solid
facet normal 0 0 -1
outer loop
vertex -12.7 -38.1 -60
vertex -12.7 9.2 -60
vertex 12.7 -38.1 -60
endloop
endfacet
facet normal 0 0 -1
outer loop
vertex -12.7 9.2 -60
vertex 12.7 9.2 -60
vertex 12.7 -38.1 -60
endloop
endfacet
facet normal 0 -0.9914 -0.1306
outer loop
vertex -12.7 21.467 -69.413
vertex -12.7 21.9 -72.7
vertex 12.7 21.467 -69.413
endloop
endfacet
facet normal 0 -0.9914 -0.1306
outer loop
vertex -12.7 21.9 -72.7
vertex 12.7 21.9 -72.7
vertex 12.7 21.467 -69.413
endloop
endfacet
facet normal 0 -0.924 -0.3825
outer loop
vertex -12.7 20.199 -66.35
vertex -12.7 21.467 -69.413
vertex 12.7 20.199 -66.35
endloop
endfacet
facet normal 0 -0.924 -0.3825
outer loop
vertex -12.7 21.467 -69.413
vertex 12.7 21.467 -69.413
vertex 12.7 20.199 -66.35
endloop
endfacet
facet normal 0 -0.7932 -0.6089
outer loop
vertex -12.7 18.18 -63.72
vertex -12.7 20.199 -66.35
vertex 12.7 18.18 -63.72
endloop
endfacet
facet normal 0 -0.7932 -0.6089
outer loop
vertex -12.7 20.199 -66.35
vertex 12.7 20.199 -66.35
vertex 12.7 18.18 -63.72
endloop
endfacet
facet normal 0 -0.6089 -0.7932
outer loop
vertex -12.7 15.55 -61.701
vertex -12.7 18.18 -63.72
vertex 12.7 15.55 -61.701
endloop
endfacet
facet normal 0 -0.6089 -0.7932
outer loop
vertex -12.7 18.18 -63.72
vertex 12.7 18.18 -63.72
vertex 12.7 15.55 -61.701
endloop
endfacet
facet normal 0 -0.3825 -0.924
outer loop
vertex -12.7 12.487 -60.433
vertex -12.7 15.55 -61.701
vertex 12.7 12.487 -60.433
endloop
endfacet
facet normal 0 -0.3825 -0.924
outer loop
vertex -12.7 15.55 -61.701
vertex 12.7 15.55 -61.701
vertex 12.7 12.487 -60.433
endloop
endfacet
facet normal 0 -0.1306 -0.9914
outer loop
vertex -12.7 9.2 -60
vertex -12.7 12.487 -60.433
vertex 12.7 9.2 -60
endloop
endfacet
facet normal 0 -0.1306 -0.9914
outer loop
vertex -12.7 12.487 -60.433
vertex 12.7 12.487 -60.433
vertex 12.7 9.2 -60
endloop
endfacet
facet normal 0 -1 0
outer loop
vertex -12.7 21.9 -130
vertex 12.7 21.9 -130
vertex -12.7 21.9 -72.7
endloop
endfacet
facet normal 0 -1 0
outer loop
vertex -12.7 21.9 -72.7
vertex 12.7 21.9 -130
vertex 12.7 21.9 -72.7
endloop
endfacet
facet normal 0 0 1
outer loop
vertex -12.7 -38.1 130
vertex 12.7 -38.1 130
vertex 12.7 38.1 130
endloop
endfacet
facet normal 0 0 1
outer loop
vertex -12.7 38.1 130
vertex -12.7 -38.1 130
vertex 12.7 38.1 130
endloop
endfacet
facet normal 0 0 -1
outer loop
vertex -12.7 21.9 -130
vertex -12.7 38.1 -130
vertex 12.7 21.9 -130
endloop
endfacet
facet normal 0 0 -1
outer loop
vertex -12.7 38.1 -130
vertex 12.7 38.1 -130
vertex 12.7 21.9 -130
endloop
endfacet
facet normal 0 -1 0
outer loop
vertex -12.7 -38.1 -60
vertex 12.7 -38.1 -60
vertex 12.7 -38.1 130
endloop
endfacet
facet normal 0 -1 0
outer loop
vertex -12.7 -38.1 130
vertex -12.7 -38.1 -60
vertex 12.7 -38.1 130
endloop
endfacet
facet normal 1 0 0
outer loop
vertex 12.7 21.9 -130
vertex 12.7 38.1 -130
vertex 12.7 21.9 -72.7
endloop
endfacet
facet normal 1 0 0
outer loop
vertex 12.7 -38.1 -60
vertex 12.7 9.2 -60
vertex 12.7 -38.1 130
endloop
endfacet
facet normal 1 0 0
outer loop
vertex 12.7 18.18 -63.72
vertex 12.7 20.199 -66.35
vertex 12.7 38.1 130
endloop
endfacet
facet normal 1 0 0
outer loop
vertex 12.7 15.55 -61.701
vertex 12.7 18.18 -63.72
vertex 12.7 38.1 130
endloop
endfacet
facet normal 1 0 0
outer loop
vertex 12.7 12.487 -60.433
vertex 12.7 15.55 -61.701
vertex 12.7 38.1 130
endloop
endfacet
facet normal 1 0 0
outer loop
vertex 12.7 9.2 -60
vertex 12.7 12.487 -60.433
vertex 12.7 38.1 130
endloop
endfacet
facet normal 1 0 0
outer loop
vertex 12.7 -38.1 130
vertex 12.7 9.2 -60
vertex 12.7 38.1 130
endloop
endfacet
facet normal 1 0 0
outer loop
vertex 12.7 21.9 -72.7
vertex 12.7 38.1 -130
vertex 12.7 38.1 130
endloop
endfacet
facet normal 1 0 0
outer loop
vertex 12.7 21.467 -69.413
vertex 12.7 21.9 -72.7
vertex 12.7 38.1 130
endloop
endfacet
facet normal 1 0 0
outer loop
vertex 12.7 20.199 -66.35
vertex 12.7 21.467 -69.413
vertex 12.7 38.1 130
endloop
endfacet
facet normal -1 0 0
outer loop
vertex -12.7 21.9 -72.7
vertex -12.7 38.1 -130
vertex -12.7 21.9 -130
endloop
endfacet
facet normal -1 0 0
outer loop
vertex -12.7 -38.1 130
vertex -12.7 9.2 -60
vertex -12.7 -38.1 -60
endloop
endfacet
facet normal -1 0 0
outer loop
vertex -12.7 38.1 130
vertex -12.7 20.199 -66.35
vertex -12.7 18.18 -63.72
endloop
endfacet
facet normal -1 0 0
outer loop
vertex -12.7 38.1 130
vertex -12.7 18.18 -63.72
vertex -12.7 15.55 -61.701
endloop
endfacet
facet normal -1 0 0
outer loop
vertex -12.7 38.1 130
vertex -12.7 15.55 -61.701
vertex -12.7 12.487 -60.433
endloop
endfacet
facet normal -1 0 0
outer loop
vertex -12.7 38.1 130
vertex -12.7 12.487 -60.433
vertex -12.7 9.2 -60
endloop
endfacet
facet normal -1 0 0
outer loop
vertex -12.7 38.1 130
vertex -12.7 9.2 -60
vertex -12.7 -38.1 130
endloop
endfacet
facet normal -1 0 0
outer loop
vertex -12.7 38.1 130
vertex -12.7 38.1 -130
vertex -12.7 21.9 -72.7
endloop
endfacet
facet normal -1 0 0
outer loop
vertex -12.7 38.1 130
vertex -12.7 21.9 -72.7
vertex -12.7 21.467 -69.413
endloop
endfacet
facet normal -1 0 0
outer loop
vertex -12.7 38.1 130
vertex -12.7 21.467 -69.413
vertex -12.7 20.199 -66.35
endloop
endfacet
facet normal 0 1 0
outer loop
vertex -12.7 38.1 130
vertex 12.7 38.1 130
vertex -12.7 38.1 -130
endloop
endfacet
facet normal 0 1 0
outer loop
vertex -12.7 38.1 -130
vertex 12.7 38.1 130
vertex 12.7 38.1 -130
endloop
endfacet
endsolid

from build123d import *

# Parameters (mm, degrees)
BOSS_EXTRUDE1_DEPTH = 12.7


with BuildPart() as part:
    # Sketch2 → Boss-Extrude1 (new, symmetric)
    with BuildSketch(Plane(origin=(0, 0, 0), x_dir=(0, 0, -1), z_dir=(1, 0, 0))):
        with BuildLine():
            Line((-130, 38.1), (130, 38.1))
            Line((130, 38.1), (130, 21.9))
            Line((130, 21.9), (72.7, 21.9))
            ThreePointArc((72.7, 21.9), (63.719743879, 18.180256121), (60, 9.2))
            Line((60, 9.2), (60, -38.1))
            Line((60, -38.1), (-130, -38.1))
            Line((-130, -38.1), (-130, 38.1))
        make_face()
    extrude(amount=BOSS_EXTRUDE1_DEPTH, both=True)


solid = part.part
